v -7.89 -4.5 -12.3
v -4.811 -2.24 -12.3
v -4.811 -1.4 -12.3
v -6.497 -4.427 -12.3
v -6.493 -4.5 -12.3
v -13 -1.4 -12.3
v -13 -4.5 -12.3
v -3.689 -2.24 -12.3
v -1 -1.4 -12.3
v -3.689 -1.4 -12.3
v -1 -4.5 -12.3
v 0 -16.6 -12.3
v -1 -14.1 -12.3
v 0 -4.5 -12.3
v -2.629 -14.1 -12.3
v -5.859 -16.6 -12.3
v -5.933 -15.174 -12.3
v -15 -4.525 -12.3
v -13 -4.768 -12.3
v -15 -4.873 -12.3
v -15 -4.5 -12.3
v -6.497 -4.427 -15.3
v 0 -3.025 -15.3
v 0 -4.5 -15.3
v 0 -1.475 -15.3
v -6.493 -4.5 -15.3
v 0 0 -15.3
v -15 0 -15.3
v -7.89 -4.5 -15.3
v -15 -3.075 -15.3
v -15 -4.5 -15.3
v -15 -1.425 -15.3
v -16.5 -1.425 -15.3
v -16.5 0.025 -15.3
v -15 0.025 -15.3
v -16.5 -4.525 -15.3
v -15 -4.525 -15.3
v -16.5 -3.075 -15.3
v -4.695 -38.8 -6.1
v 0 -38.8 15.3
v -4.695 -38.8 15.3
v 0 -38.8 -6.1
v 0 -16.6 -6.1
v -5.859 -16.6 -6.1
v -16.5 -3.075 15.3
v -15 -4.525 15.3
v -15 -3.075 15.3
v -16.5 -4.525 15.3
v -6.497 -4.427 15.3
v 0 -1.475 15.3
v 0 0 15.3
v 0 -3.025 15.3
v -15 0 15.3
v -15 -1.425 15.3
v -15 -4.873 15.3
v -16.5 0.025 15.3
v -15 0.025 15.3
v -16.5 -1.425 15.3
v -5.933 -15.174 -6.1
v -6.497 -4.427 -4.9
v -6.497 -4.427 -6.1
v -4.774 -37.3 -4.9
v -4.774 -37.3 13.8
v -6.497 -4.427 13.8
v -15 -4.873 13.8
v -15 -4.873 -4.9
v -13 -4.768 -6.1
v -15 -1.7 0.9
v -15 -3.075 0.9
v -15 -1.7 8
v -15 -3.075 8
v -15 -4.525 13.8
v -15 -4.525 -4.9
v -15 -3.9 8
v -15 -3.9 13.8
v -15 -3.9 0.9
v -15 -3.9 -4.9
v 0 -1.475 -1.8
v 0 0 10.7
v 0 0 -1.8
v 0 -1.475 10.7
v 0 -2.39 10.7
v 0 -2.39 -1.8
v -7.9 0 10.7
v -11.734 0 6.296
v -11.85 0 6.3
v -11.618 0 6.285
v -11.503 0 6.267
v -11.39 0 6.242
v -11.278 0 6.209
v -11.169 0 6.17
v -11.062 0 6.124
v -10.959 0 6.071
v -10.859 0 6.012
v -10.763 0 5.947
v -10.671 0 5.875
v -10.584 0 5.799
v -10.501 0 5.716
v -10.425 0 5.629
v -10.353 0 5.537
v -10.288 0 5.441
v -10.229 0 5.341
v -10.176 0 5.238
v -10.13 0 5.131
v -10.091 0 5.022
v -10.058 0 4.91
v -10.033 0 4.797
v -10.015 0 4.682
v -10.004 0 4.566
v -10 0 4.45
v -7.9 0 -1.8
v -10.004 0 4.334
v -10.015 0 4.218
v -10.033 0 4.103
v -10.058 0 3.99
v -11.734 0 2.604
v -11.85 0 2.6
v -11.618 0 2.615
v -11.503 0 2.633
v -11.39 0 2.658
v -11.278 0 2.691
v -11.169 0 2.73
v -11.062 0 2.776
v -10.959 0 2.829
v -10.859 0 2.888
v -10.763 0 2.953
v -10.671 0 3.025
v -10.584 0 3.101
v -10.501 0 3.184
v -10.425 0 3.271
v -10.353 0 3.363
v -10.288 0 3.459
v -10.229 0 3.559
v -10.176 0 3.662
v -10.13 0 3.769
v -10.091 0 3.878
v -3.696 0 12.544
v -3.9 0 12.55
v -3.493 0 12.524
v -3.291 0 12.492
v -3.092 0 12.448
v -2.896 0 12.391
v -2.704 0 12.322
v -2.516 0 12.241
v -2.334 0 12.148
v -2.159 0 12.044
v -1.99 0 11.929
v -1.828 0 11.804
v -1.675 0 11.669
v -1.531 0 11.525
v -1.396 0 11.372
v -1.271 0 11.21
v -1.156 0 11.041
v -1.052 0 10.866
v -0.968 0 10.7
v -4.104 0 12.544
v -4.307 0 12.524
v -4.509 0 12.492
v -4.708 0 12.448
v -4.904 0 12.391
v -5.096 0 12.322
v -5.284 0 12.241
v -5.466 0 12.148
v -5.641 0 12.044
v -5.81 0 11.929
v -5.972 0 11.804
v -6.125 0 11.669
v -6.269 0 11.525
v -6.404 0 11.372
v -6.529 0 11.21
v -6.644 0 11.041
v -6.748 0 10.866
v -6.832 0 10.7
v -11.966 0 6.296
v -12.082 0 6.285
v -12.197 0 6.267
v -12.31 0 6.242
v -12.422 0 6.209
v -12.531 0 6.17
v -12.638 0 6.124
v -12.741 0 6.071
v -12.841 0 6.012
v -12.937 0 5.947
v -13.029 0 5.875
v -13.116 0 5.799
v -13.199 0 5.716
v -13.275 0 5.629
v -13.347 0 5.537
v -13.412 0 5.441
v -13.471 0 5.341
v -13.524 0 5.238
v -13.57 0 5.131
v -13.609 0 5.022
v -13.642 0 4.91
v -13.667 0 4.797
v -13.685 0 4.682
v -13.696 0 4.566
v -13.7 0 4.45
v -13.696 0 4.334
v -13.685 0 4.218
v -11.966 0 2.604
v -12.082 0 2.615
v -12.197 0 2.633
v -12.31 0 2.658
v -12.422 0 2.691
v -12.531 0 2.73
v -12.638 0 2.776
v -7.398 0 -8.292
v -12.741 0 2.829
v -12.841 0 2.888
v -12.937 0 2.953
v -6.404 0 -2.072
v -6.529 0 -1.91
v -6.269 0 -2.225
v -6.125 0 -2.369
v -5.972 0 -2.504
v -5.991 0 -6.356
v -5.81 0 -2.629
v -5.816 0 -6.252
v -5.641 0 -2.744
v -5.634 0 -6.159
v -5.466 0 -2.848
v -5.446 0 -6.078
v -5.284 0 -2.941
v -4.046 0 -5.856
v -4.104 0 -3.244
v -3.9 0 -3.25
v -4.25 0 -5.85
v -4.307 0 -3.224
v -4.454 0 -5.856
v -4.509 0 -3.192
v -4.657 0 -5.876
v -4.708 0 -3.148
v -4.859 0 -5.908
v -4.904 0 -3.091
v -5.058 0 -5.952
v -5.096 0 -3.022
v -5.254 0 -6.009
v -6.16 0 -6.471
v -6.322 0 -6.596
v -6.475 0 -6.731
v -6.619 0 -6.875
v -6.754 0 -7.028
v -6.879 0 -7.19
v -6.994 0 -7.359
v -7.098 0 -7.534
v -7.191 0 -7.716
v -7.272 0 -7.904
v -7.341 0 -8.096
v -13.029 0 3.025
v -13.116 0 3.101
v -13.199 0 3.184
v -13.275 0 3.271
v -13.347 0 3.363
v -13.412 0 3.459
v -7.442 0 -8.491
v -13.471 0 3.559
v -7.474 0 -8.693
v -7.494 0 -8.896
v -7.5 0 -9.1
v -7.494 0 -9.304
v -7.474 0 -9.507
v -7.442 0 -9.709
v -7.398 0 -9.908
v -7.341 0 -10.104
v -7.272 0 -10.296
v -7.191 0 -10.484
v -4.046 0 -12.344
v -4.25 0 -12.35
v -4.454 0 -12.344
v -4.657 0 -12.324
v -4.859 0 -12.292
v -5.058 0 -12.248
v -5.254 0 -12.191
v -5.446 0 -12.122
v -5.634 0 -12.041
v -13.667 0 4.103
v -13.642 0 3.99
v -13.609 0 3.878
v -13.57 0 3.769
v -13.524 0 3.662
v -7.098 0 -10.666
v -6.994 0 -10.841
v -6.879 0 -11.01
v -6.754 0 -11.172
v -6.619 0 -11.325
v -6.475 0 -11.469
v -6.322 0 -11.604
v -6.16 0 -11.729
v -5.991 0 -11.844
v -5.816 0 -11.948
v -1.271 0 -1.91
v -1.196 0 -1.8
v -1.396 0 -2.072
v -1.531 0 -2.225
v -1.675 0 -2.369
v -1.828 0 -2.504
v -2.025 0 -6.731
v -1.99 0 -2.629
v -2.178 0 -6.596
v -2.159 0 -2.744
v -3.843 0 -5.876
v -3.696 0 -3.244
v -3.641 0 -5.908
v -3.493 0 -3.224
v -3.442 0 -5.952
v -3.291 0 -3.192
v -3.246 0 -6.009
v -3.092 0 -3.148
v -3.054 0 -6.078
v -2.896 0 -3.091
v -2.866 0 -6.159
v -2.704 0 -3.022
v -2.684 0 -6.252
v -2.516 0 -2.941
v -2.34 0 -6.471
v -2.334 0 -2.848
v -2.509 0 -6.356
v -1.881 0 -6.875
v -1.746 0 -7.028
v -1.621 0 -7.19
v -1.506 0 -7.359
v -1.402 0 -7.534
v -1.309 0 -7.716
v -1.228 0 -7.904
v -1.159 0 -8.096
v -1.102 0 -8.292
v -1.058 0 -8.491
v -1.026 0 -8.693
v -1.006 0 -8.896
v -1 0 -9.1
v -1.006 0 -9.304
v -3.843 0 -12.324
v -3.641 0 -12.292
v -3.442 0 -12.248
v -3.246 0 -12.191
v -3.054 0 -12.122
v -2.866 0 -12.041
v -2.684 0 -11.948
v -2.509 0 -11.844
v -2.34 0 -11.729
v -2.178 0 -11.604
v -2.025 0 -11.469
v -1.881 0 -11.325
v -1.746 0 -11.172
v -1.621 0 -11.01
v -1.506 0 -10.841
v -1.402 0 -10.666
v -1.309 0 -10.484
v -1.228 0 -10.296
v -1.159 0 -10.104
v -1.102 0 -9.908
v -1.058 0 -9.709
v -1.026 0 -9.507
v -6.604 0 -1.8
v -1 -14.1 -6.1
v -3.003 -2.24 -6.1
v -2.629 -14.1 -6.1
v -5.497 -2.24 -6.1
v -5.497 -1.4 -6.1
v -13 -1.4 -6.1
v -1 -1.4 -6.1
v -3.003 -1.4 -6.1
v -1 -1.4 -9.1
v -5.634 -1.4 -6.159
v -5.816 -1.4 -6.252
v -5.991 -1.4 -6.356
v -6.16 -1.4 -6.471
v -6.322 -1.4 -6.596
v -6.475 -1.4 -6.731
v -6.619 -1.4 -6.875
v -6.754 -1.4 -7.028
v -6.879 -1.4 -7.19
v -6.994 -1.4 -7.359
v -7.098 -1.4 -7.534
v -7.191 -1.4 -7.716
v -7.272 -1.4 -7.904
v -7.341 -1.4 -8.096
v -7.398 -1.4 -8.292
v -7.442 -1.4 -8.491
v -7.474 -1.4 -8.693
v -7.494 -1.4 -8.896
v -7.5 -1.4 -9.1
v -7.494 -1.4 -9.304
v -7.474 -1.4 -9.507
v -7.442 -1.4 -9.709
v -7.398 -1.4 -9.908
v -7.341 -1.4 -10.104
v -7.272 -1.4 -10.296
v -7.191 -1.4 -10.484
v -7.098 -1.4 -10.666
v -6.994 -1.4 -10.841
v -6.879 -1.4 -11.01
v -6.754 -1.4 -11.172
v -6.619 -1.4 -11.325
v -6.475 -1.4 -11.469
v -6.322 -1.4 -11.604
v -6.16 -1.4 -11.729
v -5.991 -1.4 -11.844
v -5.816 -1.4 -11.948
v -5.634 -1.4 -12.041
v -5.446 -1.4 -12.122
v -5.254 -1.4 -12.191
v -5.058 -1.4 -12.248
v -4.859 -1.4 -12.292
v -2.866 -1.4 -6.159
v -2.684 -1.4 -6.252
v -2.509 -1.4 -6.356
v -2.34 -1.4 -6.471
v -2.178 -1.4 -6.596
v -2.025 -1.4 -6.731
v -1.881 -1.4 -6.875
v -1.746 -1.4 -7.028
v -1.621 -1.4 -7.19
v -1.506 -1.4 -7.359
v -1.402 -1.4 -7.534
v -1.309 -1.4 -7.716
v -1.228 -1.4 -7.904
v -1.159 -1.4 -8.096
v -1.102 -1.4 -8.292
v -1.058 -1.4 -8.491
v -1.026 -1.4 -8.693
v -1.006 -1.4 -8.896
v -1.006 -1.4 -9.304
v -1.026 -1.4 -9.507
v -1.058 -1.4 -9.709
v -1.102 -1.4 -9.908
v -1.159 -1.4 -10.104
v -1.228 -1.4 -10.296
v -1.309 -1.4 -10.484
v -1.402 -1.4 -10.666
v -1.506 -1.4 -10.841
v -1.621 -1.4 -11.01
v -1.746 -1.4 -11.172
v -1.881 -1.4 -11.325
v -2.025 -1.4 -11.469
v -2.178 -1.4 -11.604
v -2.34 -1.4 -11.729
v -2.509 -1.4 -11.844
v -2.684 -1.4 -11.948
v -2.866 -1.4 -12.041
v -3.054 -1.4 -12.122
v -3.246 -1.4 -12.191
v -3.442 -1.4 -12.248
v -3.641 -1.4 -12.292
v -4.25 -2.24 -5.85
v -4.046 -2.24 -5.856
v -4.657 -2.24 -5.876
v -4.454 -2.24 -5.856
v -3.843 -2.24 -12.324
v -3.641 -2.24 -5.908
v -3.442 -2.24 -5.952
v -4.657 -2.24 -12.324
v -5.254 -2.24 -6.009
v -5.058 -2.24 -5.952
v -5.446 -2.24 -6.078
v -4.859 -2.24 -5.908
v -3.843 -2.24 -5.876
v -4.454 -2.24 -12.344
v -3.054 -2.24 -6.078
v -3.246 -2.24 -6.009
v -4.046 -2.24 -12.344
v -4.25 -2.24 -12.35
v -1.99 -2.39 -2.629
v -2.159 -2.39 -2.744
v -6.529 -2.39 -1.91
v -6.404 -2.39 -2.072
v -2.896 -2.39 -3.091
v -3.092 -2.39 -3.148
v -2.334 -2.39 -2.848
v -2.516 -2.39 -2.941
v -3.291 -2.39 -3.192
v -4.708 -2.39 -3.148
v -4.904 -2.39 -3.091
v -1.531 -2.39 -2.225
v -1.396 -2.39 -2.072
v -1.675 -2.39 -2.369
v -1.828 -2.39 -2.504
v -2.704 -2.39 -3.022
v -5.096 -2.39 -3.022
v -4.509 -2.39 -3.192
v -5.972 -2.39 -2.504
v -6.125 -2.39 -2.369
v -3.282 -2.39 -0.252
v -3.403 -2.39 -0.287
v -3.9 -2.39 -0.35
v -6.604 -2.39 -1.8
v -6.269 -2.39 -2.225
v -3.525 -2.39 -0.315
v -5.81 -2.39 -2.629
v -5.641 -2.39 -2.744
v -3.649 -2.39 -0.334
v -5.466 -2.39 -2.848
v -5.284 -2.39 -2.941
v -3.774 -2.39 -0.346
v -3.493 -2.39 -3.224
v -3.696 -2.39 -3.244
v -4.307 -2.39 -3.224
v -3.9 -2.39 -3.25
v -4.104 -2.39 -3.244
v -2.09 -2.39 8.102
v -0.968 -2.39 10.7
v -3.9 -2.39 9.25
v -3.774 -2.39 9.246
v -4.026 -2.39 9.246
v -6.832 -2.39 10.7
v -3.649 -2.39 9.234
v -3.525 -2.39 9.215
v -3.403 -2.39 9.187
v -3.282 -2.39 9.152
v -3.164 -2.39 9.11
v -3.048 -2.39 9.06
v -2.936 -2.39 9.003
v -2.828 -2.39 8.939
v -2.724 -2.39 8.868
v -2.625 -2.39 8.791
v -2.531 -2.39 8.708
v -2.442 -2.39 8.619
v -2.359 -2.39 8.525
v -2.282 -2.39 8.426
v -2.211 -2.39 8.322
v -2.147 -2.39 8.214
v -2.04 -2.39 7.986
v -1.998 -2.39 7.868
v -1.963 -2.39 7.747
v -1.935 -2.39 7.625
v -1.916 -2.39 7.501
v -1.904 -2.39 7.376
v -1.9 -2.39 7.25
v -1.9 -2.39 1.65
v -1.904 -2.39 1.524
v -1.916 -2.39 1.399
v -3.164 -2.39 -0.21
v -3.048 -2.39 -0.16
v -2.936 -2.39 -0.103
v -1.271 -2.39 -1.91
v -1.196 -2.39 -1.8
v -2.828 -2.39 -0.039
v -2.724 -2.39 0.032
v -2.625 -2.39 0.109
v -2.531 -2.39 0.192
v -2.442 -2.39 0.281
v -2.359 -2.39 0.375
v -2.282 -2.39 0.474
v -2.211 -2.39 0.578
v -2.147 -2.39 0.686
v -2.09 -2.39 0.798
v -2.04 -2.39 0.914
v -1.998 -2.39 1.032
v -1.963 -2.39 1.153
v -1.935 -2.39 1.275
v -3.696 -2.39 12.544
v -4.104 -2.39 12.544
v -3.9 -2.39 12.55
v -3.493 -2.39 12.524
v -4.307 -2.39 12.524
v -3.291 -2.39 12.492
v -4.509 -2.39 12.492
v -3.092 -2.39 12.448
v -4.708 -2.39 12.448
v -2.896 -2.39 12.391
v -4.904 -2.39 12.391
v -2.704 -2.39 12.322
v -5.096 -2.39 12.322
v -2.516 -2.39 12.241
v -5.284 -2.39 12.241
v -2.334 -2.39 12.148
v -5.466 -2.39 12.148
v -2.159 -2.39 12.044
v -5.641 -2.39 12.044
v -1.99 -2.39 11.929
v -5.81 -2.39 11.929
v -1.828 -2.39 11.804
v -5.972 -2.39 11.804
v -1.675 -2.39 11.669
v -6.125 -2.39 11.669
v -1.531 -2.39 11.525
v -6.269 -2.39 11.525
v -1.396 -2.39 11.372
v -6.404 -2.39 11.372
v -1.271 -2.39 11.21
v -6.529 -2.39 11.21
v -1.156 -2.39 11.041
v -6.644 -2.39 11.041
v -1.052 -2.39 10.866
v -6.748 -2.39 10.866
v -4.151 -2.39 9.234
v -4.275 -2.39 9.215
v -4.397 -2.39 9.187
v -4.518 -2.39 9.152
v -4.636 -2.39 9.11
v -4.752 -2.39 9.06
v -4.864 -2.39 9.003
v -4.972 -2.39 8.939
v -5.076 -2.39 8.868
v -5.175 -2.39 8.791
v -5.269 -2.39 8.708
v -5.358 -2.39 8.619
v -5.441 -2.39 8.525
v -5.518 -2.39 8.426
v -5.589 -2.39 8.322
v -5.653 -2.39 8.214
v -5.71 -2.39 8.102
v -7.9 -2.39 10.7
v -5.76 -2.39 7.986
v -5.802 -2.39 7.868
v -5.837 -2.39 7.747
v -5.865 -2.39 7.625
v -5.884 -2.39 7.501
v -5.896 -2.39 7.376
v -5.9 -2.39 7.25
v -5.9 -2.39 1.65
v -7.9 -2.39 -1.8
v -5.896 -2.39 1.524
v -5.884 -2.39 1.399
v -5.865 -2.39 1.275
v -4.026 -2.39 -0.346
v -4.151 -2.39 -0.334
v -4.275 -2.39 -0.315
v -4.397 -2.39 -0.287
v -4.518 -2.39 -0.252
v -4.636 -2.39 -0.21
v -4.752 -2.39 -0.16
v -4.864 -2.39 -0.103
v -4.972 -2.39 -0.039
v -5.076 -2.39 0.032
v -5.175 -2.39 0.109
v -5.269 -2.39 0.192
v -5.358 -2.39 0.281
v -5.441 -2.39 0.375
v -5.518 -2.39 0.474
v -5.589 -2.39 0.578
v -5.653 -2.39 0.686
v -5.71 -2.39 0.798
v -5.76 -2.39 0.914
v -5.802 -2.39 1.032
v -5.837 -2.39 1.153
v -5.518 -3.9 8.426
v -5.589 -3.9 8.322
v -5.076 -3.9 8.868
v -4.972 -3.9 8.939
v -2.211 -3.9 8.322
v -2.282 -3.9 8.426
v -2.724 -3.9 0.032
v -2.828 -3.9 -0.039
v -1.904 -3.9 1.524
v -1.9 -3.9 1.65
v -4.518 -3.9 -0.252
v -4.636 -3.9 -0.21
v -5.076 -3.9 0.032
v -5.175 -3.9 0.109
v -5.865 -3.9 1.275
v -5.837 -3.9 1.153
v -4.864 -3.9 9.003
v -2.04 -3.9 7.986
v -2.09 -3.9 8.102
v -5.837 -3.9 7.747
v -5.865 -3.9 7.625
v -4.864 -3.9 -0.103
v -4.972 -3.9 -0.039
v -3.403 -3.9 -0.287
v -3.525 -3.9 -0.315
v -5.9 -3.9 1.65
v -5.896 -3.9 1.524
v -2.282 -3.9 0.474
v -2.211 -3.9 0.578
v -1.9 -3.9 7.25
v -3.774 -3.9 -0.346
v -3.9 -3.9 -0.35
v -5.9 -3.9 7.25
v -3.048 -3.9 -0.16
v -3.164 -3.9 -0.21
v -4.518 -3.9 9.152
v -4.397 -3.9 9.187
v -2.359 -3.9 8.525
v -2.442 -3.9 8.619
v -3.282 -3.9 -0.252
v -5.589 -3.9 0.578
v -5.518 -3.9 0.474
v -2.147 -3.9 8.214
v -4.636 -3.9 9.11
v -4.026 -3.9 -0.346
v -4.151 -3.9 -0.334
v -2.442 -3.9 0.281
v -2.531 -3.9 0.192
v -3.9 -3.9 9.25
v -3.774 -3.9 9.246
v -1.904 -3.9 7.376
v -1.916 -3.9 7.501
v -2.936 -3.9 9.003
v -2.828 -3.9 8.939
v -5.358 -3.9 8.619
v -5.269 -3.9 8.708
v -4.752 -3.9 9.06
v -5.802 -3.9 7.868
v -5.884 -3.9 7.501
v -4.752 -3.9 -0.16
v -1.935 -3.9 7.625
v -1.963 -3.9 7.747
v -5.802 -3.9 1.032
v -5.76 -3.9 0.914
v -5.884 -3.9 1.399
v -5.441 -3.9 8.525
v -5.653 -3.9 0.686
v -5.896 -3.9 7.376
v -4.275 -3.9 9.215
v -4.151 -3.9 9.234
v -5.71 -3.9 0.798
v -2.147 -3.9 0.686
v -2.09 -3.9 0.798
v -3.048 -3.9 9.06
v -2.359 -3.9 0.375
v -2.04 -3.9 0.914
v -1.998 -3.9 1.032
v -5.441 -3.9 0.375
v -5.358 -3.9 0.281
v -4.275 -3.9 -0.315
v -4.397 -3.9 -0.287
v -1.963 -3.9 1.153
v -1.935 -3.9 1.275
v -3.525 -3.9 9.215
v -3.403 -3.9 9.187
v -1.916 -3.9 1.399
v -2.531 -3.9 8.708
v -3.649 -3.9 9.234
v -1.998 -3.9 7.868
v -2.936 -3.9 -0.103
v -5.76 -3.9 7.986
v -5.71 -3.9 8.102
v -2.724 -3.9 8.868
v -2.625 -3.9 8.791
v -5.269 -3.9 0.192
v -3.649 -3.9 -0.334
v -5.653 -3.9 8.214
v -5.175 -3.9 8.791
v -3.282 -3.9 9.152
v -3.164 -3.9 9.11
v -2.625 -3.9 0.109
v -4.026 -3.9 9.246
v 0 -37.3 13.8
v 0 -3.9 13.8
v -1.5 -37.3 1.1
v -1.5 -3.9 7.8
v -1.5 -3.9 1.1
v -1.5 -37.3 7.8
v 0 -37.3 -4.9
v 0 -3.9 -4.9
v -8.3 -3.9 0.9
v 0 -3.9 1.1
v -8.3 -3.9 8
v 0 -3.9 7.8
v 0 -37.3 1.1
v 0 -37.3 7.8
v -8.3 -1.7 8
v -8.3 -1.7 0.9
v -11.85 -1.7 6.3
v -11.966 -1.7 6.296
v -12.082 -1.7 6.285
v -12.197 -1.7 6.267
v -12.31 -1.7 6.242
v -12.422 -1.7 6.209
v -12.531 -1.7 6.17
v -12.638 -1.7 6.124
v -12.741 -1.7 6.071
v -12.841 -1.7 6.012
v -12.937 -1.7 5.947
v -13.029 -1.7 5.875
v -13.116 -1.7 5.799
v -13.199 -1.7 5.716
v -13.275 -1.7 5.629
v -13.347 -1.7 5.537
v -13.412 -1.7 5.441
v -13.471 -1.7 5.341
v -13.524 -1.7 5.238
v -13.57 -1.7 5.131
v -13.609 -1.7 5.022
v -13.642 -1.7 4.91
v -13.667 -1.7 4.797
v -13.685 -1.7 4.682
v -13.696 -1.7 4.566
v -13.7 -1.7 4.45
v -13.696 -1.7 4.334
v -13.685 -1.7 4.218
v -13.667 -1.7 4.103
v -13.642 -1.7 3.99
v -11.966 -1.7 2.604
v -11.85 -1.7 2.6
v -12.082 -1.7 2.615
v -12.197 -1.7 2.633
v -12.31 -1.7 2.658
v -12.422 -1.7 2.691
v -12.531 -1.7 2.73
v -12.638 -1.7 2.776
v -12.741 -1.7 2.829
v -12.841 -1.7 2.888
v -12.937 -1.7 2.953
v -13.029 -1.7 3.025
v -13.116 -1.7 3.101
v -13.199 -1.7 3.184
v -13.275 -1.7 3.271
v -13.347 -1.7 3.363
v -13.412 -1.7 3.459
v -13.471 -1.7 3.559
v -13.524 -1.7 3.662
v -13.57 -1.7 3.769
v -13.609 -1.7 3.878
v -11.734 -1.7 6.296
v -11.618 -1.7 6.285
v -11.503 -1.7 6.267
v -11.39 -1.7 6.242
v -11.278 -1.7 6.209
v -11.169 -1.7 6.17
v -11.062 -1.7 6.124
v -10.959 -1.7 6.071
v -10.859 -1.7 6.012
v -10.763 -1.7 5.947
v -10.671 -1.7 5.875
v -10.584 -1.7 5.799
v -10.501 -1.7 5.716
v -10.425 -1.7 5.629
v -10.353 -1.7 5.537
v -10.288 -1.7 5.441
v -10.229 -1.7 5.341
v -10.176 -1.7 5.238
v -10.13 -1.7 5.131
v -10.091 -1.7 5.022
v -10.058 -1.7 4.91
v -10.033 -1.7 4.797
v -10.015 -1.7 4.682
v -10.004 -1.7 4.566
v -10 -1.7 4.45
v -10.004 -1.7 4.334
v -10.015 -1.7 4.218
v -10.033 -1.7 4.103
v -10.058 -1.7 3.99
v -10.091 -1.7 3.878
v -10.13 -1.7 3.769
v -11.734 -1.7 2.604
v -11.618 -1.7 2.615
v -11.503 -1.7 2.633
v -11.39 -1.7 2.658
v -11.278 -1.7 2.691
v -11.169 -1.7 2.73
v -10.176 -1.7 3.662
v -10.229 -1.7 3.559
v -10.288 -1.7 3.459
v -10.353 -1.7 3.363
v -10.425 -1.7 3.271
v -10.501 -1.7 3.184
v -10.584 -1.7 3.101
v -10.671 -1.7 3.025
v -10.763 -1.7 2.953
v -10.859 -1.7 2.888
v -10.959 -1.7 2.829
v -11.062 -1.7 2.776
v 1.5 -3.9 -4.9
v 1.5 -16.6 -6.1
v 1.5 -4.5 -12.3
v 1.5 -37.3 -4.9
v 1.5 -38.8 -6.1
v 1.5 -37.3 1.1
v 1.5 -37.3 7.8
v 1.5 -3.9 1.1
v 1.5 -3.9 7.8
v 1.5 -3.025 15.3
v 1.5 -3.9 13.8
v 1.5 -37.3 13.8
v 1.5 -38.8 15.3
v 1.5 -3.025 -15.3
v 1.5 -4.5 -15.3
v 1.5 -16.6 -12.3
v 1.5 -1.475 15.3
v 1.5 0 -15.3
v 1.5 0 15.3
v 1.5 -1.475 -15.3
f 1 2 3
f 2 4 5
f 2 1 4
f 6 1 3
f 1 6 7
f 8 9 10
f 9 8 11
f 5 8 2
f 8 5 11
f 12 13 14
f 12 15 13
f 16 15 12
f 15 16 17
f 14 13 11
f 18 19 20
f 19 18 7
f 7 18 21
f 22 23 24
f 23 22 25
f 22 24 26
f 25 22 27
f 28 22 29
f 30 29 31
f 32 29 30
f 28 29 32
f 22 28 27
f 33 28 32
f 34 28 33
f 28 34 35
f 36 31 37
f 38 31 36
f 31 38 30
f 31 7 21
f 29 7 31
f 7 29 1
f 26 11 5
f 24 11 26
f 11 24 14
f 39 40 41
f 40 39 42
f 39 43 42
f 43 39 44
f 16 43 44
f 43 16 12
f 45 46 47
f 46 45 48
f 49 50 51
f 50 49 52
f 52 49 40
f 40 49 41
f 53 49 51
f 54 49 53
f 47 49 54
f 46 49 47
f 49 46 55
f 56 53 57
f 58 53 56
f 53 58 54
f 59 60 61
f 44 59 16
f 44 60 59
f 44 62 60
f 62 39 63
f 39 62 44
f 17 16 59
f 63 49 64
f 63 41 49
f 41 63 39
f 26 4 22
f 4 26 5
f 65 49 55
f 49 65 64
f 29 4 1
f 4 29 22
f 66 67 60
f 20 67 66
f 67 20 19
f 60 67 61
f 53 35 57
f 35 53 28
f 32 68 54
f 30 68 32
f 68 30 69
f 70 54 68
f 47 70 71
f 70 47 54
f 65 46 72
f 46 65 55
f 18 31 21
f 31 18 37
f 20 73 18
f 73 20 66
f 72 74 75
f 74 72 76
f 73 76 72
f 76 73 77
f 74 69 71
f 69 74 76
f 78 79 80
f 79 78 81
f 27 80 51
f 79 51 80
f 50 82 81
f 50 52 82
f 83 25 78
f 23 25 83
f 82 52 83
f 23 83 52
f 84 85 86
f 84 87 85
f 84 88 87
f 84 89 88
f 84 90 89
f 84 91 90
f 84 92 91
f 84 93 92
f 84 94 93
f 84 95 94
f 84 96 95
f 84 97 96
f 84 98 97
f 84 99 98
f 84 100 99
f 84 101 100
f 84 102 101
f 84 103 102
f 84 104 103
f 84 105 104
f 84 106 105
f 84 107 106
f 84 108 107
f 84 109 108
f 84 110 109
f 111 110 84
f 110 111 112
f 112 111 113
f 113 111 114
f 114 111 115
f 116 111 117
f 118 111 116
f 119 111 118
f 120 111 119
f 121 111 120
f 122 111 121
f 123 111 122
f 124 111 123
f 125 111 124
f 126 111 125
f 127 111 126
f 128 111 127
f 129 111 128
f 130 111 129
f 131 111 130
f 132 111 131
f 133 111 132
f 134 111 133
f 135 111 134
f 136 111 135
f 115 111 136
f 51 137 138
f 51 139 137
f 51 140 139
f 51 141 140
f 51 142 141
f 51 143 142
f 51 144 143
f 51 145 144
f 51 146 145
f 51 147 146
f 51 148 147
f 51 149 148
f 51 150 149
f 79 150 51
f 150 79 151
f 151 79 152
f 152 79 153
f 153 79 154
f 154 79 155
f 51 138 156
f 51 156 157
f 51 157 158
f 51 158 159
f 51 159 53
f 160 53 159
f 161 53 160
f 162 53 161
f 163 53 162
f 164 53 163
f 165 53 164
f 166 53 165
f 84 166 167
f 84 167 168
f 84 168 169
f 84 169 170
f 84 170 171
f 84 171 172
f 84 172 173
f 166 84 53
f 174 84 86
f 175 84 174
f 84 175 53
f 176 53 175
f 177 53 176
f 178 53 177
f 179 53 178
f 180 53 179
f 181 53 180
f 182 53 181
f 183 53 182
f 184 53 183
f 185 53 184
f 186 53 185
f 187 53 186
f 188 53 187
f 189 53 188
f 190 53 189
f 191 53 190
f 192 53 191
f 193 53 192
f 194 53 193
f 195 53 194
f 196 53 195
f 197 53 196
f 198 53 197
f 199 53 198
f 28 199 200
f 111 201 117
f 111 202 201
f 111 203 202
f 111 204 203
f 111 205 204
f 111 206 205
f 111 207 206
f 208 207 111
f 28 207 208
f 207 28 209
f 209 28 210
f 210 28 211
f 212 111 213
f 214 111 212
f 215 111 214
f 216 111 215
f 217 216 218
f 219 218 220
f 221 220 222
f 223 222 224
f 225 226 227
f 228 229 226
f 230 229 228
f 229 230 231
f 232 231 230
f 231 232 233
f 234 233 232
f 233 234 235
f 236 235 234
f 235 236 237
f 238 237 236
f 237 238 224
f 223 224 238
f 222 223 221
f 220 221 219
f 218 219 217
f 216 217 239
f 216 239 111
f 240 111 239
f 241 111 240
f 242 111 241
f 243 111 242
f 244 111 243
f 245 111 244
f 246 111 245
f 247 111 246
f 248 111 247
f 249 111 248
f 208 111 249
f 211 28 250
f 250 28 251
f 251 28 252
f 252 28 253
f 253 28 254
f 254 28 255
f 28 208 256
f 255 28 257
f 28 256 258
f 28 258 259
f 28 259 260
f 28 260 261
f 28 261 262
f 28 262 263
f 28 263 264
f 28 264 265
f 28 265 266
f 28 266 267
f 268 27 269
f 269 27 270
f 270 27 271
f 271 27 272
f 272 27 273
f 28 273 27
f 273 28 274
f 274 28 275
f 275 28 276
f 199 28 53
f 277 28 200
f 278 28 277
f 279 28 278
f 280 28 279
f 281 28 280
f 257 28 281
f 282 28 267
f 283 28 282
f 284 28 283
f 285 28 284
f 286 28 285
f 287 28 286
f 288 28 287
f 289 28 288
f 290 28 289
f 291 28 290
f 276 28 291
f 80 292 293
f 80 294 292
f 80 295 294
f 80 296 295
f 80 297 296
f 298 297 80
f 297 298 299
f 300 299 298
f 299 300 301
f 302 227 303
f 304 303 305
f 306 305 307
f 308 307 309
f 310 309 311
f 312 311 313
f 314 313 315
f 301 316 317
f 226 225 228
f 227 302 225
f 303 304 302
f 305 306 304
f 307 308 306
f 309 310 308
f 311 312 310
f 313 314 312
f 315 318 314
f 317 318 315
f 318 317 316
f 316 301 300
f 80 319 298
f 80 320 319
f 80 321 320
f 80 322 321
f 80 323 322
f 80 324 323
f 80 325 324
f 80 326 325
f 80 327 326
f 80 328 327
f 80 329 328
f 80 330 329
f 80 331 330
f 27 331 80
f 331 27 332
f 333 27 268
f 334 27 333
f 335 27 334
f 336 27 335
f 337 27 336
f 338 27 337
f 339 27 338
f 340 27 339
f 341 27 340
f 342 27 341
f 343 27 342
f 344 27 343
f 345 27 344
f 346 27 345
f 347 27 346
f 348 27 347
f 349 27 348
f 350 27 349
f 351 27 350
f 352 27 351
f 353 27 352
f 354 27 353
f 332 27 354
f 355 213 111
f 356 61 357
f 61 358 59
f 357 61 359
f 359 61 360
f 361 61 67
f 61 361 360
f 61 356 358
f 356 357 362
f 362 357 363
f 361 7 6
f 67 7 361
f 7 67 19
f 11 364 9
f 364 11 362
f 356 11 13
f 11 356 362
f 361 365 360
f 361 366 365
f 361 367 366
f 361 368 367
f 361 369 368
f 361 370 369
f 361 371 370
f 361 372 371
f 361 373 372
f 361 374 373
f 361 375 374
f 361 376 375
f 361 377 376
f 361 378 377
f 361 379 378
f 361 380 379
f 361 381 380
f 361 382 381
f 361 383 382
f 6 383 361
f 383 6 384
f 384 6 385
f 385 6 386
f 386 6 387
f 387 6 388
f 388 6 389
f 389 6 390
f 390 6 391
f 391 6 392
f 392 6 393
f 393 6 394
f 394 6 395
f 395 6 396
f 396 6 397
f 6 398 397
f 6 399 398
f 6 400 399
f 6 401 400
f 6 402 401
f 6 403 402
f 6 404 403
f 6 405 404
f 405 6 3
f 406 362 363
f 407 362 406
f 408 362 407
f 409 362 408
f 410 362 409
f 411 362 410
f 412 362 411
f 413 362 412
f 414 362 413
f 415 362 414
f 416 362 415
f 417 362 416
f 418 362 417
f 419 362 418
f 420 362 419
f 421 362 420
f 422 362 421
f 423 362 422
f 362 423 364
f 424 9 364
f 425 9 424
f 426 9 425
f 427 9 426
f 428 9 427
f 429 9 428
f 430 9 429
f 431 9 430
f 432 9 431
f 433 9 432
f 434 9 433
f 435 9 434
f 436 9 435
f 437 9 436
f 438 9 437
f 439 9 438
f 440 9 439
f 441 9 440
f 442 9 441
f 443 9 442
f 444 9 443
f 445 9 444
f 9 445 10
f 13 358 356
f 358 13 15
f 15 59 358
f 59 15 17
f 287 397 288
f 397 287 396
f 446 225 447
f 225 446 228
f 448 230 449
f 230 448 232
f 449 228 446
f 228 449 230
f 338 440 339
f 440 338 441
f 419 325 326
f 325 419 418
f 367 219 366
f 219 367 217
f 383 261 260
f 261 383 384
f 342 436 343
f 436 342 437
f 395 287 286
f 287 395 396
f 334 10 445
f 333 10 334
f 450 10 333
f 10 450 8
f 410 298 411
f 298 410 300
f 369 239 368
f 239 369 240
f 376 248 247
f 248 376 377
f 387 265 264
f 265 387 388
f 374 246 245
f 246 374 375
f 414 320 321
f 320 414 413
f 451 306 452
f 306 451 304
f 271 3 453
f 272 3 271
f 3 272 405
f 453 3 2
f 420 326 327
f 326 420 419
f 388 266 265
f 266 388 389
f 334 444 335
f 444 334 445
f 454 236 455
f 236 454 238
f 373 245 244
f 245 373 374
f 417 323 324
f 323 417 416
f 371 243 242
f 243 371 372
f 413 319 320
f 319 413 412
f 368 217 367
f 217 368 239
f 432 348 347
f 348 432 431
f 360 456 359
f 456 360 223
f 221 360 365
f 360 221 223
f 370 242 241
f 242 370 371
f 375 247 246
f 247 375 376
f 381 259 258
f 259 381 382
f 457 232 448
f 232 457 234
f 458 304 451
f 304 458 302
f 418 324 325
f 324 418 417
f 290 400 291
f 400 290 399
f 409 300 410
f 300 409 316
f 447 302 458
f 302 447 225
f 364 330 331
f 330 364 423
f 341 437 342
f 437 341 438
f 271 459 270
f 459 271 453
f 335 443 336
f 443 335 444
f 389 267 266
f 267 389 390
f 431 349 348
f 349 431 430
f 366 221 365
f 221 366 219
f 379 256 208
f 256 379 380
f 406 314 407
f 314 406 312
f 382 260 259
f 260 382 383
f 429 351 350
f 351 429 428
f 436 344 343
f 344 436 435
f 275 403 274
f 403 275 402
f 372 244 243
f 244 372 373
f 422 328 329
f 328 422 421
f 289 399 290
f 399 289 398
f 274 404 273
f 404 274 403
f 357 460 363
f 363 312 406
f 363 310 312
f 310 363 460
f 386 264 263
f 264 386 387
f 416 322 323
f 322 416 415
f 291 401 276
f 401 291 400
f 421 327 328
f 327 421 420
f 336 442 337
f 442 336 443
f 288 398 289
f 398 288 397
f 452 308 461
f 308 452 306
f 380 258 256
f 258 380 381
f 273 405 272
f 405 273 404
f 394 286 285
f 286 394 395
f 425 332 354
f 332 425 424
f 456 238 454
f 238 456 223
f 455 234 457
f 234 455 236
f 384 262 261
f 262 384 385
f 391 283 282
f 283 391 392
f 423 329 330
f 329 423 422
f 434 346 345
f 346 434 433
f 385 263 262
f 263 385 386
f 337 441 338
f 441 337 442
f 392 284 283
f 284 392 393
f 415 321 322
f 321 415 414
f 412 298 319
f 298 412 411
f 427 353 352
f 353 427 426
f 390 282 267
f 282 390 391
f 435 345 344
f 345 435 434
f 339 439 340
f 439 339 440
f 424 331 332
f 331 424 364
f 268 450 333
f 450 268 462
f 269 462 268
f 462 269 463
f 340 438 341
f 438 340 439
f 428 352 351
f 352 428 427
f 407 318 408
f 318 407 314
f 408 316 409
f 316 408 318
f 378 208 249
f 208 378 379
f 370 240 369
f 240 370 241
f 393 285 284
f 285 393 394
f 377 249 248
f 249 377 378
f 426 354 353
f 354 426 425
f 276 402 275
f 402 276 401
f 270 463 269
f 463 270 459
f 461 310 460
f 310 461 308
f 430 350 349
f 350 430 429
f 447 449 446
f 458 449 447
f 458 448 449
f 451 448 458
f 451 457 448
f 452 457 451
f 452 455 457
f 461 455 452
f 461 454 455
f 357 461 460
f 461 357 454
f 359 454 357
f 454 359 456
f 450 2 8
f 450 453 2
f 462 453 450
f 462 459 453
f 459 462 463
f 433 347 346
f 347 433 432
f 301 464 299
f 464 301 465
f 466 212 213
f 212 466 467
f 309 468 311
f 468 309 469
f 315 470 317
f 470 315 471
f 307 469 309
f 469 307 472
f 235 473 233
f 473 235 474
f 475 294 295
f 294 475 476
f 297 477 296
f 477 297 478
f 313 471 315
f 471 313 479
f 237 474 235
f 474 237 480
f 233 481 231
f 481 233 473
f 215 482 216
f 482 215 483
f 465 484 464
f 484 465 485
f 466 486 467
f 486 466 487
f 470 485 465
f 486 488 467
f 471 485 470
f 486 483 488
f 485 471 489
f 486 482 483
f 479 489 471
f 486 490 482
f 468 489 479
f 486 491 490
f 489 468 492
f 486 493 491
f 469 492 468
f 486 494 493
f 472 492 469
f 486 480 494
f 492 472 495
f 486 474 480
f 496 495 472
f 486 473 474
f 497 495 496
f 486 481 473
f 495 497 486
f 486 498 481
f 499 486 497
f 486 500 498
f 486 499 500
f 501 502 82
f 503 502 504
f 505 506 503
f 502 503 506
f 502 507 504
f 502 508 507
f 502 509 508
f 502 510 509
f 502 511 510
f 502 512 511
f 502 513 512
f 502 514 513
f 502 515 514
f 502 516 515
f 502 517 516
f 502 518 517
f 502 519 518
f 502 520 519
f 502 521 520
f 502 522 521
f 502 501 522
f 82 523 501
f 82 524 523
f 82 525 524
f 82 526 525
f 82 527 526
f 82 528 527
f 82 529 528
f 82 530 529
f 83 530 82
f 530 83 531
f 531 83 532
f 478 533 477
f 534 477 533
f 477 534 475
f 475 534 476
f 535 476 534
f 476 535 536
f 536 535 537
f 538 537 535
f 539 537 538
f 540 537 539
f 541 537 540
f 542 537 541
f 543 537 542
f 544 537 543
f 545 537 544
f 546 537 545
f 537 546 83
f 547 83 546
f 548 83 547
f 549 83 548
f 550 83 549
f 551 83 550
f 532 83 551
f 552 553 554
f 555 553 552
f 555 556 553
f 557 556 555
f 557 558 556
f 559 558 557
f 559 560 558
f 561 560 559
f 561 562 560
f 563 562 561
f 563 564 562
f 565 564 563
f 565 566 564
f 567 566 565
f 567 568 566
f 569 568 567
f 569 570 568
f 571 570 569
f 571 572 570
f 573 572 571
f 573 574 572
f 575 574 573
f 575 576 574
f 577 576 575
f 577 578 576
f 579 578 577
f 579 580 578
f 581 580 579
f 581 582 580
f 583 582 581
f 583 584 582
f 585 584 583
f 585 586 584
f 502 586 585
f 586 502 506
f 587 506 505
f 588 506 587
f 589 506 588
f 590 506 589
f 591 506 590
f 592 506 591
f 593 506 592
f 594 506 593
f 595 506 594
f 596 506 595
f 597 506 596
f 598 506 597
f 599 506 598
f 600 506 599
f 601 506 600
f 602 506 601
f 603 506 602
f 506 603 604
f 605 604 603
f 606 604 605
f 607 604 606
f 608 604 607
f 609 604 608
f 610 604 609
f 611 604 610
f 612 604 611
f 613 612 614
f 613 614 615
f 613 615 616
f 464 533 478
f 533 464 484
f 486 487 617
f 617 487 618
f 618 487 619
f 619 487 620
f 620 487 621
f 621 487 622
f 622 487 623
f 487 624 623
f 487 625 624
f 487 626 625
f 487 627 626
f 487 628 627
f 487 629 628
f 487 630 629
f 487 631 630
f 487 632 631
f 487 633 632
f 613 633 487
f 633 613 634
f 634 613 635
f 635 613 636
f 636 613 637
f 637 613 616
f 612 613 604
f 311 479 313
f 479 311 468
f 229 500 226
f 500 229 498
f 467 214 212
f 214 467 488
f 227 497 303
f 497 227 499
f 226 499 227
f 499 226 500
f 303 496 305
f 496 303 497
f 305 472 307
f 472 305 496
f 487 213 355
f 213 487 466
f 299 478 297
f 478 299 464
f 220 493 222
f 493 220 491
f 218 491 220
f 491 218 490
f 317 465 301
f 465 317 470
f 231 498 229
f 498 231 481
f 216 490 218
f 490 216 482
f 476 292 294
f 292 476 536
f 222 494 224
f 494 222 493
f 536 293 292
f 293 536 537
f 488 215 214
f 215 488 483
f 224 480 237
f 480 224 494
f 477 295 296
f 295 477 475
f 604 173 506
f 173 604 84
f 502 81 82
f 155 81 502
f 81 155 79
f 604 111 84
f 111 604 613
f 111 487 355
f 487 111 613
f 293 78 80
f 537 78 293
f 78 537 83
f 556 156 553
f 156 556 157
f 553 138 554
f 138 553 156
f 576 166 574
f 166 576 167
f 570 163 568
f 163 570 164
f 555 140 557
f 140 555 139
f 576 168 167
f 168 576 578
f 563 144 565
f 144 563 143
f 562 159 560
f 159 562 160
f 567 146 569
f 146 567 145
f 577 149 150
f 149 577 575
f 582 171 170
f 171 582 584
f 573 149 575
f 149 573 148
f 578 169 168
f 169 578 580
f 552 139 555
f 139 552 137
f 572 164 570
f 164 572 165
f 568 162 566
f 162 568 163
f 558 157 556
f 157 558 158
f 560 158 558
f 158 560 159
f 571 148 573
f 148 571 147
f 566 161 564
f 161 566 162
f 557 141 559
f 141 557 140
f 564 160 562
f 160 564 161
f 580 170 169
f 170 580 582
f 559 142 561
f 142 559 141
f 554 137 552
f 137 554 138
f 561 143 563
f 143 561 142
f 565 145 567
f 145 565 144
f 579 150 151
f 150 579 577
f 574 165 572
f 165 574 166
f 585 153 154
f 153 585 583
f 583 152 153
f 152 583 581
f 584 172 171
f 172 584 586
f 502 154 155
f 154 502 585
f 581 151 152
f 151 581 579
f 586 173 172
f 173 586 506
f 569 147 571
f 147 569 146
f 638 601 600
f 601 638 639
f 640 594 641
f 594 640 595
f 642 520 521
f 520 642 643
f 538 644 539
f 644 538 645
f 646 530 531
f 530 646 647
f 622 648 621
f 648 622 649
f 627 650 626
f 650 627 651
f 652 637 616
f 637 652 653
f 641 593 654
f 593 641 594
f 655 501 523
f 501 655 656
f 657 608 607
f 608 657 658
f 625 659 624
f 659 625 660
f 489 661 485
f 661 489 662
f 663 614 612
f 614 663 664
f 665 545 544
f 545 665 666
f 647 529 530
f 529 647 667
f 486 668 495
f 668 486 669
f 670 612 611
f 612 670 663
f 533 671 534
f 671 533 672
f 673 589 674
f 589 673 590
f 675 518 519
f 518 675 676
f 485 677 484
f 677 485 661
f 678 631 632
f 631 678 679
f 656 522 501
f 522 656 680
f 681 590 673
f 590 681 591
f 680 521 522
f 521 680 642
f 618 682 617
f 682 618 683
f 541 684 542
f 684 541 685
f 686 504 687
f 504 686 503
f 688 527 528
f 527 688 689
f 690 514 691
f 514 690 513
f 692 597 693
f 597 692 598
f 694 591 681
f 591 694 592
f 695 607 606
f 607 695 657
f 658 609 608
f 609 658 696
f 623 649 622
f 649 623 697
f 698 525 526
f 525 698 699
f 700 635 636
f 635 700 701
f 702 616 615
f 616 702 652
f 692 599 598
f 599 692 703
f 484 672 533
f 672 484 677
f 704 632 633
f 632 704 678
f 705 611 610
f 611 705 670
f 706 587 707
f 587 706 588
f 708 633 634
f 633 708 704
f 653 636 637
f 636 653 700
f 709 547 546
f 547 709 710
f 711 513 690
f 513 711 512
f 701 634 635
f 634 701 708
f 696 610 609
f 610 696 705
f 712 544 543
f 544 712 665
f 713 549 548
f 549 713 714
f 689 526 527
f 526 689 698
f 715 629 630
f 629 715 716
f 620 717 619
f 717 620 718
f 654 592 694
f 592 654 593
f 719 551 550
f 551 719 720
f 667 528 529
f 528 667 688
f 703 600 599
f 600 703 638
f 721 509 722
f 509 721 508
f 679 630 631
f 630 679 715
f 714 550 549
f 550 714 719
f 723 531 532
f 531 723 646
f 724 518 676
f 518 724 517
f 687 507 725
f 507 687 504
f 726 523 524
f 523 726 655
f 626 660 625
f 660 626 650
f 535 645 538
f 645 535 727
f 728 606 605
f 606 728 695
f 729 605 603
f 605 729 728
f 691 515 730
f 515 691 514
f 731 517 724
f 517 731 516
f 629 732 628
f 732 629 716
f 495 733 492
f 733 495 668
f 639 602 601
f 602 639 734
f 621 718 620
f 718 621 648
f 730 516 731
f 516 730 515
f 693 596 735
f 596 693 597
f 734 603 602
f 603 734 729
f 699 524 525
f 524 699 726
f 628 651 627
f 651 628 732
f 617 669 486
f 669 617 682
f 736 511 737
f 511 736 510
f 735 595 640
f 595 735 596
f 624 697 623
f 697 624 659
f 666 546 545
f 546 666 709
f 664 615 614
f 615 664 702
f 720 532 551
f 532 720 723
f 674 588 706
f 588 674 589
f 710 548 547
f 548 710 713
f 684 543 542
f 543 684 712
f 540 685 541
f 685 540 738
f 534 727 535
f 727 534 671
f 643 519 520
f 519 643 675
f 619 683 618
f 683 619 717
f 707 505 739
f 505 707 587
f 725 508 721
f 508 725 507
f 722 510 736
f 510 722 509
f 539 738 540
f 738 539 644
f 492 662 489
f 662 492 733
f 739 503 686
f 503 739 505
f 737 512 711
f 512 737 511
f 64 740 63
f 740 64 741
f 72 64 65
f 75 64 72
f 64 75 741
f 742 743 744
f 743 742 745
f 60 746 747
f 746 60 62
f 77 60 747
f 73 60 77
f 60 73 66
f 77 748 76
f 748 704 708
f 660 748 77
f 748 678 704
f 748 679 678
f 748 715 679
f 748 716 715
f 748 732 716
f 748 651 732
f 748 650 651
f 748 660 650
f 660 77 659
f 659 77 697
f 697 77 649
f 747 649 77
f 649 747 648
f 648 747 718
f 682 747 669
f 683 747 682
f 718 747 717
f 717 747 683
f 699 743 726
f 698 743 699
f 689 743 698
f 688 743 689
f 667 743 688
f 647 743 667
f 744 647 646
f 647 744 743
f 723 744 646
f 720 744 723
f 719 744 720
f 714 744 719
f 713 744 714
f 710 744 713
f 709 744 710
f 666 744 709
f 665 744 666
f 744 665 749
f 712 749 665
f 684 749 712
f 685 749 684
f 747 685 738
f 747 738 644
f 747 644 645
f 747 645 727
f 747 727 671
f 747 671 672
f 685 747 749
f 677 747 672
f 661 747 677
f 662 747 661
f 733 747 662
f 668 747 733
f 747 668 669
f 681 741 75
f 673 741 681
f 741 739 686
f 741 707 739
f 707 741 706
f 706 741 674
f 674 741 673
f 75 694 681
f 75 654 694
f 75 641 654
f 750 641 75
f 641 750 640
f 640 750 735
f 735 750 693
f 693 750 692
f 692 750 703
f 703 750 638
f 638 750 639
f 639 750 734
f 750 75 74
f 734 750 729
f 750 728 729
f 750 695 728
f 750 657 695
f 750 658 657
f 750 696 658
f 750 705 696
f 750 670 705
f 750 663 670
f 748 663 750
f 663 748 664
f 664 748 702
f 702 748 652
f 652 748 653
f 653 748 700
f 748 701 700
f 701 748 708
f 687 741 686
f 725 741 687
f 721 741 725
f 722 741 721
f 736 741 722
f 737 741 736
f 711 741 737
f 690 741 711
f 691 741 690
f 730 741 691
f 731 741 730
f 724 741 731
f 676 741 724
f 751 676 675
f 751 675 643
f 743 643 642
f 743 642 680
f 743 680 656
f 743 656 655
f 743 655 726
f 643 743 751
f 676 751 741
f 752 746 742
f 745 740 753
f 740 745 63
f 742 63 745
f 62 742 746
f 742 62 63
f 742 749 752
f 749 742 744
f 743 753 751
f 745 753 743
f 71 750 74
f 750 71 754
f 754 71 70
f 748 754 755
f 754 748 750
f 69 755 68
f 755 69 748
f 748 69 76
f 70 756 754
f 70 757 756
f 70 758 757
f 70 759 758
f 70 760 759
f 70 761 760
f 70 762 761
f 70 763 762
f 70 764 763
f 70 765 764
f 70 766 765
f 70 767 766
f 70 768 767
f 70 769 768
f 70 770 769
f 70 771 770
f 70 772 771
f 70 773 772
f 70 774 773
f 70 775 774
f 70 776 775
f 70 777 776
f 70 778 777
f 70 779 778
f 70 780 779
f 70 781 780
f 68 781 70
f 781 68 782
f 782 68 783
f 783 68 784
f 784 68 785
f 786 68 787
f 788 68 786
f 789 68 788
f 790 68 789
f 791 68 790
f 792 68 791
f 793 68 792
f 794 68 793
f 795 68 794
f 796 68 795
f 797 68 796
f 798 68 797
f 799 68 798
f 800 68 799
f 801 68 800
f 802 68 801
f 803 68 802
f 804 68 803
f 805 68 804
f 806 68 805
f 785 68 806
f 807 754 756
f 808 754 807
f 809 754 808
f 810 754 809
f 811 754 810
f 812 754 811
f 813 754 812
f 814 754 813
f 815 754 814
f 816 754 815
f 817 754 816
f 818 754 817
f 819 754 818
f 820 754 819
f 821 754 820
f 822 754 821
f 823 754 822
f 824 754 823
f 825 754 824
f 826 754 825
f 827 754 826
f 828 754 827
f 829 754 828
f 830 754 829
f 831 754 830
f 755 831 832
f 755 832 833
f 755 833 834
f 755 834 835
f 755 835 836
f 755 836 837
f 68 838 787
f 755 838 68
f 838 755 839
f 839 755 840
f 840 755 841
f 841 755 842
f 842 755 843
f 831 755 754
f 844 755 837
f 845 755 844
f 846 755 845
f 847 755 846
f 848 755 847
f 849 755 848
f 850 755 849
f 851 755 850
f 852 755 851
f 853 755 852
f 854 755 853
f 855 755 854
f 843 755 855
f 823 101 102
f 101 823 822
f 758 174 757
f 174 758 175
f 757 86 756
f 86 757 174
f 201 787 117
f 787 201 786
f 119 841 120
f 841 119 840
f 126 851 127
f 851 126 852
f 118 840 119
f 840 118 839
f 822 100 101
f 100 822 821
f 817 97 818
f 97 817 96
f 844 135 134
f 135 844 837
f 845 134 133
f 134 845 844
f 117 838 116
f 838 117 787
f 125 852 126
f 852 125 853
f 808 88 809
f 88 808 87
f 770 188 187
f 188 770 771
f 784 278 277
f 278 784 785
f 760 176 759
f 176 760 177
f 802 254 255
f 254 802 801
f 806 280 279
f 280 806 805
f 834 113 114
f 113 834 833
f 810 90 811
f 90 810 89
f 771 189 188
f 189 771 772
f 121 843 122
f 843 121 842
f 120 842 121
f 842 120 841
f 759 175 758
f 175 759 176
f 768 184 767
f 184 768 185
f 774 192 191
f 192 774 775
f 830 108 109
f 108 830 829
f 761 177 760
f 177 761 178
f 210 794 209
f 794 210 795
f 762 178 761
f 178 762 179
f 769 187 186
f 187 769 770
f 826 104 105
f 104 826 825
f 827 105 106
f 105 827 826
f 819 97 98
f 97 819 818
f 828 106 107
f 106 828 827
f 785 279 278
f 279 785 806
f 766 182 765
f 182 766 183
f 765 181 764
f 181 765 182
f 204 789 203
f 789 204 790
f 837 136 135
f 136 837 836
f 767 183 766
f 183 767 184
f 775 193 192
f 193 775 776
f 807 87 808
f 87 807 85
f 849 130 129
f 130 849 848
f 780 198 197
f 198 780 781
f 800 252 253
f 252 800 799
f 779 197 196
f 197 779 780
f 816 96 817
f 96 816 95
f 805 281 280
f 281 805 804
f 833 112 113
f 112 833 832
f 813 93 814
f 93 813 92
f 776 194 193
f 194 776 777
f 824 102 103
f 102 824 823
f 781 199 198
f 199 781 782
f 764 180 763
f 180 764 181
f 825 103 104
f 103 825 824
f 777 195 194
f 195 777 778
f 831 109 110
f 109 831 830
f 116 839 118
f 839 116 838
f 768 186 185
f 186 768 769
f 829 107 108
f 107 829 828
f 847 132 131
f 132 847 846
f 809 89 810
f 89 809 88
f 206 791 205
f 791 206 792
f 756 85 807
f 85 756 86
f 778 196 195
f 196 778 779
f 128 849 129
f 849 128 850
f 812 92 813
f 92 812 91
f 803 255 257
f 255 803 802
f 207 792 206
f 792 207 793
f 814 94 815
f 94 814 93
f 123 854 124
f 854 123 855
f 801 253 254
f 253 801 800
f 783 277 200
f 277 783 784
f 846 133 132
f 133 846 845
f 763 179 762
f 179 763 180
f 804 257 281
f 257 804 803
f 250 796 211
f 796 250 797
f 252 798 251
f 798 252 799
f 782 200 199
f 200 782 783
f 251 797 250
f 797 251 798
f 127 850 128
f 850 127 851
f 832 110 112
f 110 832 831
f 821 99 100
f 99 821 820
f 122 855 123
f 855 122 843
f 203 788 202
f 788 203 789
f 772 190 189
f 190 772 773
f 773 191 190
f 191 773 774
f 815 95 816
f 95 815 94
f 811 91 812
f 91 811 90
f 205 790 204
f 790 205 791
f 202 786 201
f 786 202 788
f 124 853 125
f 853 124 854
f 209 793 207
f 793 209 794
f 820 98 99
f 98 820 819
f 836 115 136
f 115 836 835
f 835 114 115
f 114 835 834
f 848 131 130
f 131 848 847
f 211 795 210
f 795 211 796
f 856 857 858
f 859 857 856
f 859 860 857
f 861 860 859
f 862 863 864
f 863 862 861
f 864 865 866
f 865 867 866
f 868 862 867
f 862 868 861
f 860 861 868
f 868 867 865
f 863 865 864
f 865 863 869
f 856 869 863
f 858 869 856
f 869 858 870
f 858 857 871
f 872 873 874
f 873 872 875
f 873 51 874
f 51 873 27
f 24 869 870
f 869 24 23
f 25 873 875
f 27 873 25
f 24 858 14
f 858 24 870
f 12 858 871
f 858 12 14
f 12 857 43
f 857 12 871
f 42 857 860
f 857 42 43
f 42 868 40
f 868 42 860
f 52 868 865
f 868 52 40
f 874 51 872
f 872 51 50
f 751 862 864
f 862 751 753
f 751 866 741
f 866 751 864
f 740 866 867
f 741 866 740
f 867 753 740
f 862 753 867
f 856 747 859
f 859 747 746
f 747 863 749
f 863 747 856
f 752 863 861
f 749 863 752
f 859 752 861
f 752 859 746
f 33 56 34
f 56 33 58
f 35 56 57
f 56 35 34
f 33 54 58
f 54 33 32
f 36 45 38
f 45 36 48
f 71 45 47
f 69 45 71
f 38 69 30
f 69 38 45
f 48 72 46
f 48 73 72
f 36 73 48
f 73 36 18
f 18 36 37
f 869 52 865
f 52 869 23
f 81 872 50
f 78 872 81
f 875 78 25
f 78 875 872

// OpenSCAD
/* there's tons of magic numbers here because 
 * i exported a semi-done parametric version from clojure
 * and didn't fix all the formulas for x and y translates....
 * before getting it fully working and for getting how the working scad version
 * diverged from the clojure version.......................
 *
 * sorry future person trying to change this, you will need 
 * a strong dragon spear to modify any 'kinda adjustable' values */

reset_holder = true;
vertical = true;
cutout_blank = false;
show_previous = false;

controller_adj = 0.0;

usb_holder_x = 30.6;       // kinda adjustable
usb_holder_y = 38.8 + controller_adj;       // kinda adjustable
usb_holder_z = reset_holder? 15 : 8.4;        // kinda adjustable

usb_holder_border = 1.5;   // kinda adjustable

/* this combination of controller and usb_c dimensions 
 * friction fits both generations of elite-c controllers */
usb_elite_c_x = 18.7;      // kinda adjustable
usb_elite_c_y = 33.4 + controller_adj;      // mostly adjustable
usb_elite_c_side_cut = 6;  // adjustable

usb_c_x = 9.3;             // adjustable
usb_c_z = 4.0;             // kinda adjustable

trrs_x = 6.2;              // mostly adjustable
trrs_y = 12.7;             // kinda adjustable
trrs_r = 3.25;             // adjustable

usb_holder_center_x = usb_holder_x / 2;
usb_holder_center_y = usb_holder_y / 2;
usb_holder_center_z = usb_holder_z / 2;

usb_holder_notch_xy = usb_holder_border;
usb_holder_notch_down = usb_holder_border * usb_holder_notch_xy;
usb_holder_notch_half = usb_holder_notch_xy / 2;

$fn = 100;

module basicShape() {
  difference () {
    //basic starting shape to cut away from  `
    cube ([usb_holder_x, usb_holder_y, usb_holder_z], center=true);
    
    left_cut_x = 2 * usb_holder_border;
    left_cut_y = 3 * usb_holder_border;
    
    bottom_cut_x = (left_cut_x + trrs_x);
    bottom_cut_y = (left_cut_x + trrs_x);
    
    cut1_x = (usb_holder_center_x -  usb_holder_border);
    cut1_y = (usb_holder_center_y - (usb_holder_center_y - left_cut_y/2));
    
    cut2_x = (usb_holder_center_x - (bottom_cut_x / 2));
    //cut2_y = (usb_holder_center_y - (- usb_holder_center_y (16.6 / 2))); //todo
      
    //misc magic numbers
    if (!cutout_blank) {
      union () {
        translate ([-cut1_x, -cut1_y, 0]) {
          cube ([left_cut_x, (usb_holder_y - left_cut_y), 99], center=true);
        }
        translate ([-cut2_x, -8.3, 0]) {
          cube ([bottom_cut_x, (usb_holder_y - 16.6), 99], center=true);
        }
        rotate (a=3, v=[1, 0, 0]) {
          top_cut_adjust = reset_holder? 1.75*usb_holder_border : usb_holder_border;
          translate ([0, -(usb_holder_border * 3), (usb_holder_z / top_cut_adjust) ]) {
            cube ([usb_holder_x, usb_holder_y, usb_holder_z], center=true);
          }
        }
      }
    }
    
    if (!vertical) {
      // side notches that key into other object
      notch_x = (usb_holder_center_x - usb_holder_notch_half);
      notch_y = (usb_holder_center_y - usb_holder_notch_down);
      translate ([ notch_x, notch_y, 0]) { notch(); }
      translate ([-notch_x, notch_y, 0]) { notch(); }
    }
  }
}
module notch() {
    cube ([usb_holder_notch_xy, usb_holder_notch_xy - 0.05, 30.6], center=true);
}

module trrsCutouts() {
    trrs_floor = 1;
    trrs_squareCutoutHeight = 12;
    trrs_squareCutoutHeightOffset = trrs_floor - usb_holder_center_z + trrs_squareCutoutHeight/2;
    translate ([-9.2, 11.65 + controller_adj/2, trrs_squareCutoutHeightOffset]) {
        cube ([trrs_x, trrs_y, trrs_squareCutoutHeight], center=true);
    }
    
    trrsAngle_z_adjust = reset_holder? 0.5 : 4;
    trrsAngle_z_factor = reset_holder? 0.5 : 1;
    translate ([-9.2, 11.65-trrs_y/3+ controller_adj/2, trrsAngle_z_adjust * usb_holder_border]) {
        rotate (a=-72.0, v=[1, 0, 0]) {
            cube ([trrs_x, trrs_y, usb_holder_z * trrsAngle_z_factor], center=true);
        }
    }
    
    trrs_y_offset = (usb_holder_center_y - (usb_holder_border / 2) +0.01);// + controller_adj;
    trrs_z_offset = (usb_holder_center_z - (trrs_floor + trrs_r));
    translate ([-9.1, trrs_y_offset, -trrs_z_offset]) {
        rotate (a=90.0, v=[1, 0, 0]) {
           cylinder (h=(usb_holder_border * 2), r=trrs_r, center=true);
        }
    }
}

module resetCutout() {
    reset_xz = 7.1;
    reset_y = 4.4;
    reset_floor = usb_holder_z / 1.5 ;
    reset_r = 1.85;
    
    reset_x_offset = usb_holder_center_x - usb_elite_c_x / 2 - usb_holder_border;
    reset_y_offset = usb_holder_center_y - usb_elite_c_y - usb_holder_border;
    reset_z_offset = usb_holder_center_z - (reset_floor + reset_r);
    
    translate ([reset_x_offset, -reset_y_offset, -reset_z_offset]) {
        cube ([reset_xz, reset_y, reset_xz], center=true);
    }
    
    translate ([reset_x_offset, 0, -reset_z_offset]) {
        rotate (a=90.0, v=[1, 0, 0]) {
          cylinder (h=99, r=reset_r, center=true);
        }
    }
}

module eliteC() {
    x_offset = ( (usb_holder_center_x - (usb_elite_c_x / 2)) - usb_holder_border);
    y_offset = (-(usb_holder_center_y - (usb_elite_c_y / 2)) + usb_holder_border);
    z_offset = usb_holder_border;
    translate ([x_offset, y_offset, z_offset]) {
        cube ([usb_elite_c_x, usb_elite_c_y, usb_holder_z], center=true);
    }

    left_cut_x  = ((usb_holder_center_x - (usb_elite_c_x / 2)) - ((usb_elite_c_x / 2) - (usb_elite_c_side_cut / 2)) - usb_holder_border);
    right_cut_x = ((usb_holder_center_x - (usb_elite_c_x / 2)) + ((usb_elite_c_x / 2) - (usb_elite_c_side_cut / 2)) - usb_holder_border);
    translate ([left_cut_x , y_offset, 0]) { circuitBoardSlots(); }
    translate ([right_cut_x, y_offset, 0]) { circuitBoardSlots(); }

    usbPort_z_adjust = reset_holder? -3.6 : -0.3;
    translate([0, 0, usbPort_z_adjust]) {
        usbPortCutout();
        usbRecessCutout();
    }
}

module circuitBoardSlots() {
    cube ([usb_elite_c_side_cut, usb_elite_c_y, 99], center=true);
}

module usbPortCutout() {
    usbPortCenter = ((usb_holder_center_x - (usb_elite_c_x/2)) - usb_holder_border);
    usbPortCenterCut = (usb_c_x - usb_c_z);
    usbPortSideOffset = usbPortCenterCut / 2 + 0.15;
    usbPortCenterCutLength = 20;
    
    translate ([usbPortCenter, 20, 0]) {
      hull() {
	rotate (a=90.0, v=[1, 0, 0]) {
	  translate ([-usbPortSideOffset, 0, 0]) {
	    cylinder (h=usbPortCenterCutLength, r=usb_c_z/2);
	  }
	  translate ([usbPortSideOffset, 0, 0]) {
	    cylinder (h=usbPortCenterCutLength, r=usb_c_z/2);
	  }
	}
      }
    }
}

module usbRecessCutout() {
    usb_c_cover_plate = usb_holder_border;
    recess_y = (usb_holder_y - usb_elite_c_y - usb_holder_border - usb_c_cover_plate);
    recess_z = 8;
    translate ([0, (usb_holder_center_y - (recess_y / 2) +0.01), 0]) {
        
        translate ([0, 0, 0]) {
            rotate (a=90.0, v=[1, 0, 0]) {
                cylinder (h=recess_y, r=3.25, center=true);
            }
        }
        translate ([(+(usb_holder_center_x - (usb_elite_c_x/2)) - usb_holder_border), 0, 0]) {
            cube ([12.5, recess_y, recess_z], center=true);
        }
        translate ([(usb_c_x), 0, 0]) {
            rotate (a=90.0, v=[1, 0, 0]) {
                cylinder (h=recess_y, r=3.25, center=true);
            }
        }
    }
}

// main method
module usb_holder() {
    //adjust origin to front fact, bottom, mostly to match existing STLs
    translate([0, -(usb_holder_y/2), (usb_holder_z/2)]) {
        
        difference () {
            basicShape();
            if (!cutout_blank) {
                trrsCutouts();
                eliteC();
                if (reset_holder) {
                    resetCutout();
                }
            }
        }
    }
    if (show_previous) {
        color( "grey", 0.6 )
          translate([0,0,0])
            union() {
              rotate([0,0,0])
              import("../elite-c_holder_w_reset.stl");
            }
    }
}

module vertical_usb_holder() {
    difference() {
        union () {
            rotate (a=-90.0, v=[0, 1, 0]) {
                union() {
                    usb_holder();
                    translate ([0, 0, -1.5]) {
                        linear_extrude(height=usb_holder_notch_xy) {
                            projection(cut=false) {
                                usb_holder();
                            }
                        }
                    }
                }
            }
            
            // side notches that key into other object
            notch_x = (usb_holder_center_x - usb_holder_notch_half);
            notch_y = (usb_holder_center_y - usb_holder_notch_down);
            
            translate ([-15.75, -0.70, 0]) { notch(); }
            translate ([-15.75, -3.80, 0]) { notch(); }
            if (cutout_blank) {
                for ( i = [1.5:1.5:37]) {
                    translate ([-15.75, -(3.75 + i), 0]) { notch(); }
                }
            }
        }
        translate ([0.75, -usb_holder_notch_xy*1.5 - 0.05, 0]) { notch(); }
        translate ([0.75, -usb_holder_notch_xy*1.5 + 0.05, 0]) { notch(); }
    }
    if (show_previous) {
        color( "grey", 0.6 )
          translate([0,0,0])
            union() {
              rotate([0,270,0])
              import("../elite-c_holder_w_reset.stl");
            }
    }
}

if (vertical) {
    vertical_usb_holder();
} else {
    usb_holder();
}
